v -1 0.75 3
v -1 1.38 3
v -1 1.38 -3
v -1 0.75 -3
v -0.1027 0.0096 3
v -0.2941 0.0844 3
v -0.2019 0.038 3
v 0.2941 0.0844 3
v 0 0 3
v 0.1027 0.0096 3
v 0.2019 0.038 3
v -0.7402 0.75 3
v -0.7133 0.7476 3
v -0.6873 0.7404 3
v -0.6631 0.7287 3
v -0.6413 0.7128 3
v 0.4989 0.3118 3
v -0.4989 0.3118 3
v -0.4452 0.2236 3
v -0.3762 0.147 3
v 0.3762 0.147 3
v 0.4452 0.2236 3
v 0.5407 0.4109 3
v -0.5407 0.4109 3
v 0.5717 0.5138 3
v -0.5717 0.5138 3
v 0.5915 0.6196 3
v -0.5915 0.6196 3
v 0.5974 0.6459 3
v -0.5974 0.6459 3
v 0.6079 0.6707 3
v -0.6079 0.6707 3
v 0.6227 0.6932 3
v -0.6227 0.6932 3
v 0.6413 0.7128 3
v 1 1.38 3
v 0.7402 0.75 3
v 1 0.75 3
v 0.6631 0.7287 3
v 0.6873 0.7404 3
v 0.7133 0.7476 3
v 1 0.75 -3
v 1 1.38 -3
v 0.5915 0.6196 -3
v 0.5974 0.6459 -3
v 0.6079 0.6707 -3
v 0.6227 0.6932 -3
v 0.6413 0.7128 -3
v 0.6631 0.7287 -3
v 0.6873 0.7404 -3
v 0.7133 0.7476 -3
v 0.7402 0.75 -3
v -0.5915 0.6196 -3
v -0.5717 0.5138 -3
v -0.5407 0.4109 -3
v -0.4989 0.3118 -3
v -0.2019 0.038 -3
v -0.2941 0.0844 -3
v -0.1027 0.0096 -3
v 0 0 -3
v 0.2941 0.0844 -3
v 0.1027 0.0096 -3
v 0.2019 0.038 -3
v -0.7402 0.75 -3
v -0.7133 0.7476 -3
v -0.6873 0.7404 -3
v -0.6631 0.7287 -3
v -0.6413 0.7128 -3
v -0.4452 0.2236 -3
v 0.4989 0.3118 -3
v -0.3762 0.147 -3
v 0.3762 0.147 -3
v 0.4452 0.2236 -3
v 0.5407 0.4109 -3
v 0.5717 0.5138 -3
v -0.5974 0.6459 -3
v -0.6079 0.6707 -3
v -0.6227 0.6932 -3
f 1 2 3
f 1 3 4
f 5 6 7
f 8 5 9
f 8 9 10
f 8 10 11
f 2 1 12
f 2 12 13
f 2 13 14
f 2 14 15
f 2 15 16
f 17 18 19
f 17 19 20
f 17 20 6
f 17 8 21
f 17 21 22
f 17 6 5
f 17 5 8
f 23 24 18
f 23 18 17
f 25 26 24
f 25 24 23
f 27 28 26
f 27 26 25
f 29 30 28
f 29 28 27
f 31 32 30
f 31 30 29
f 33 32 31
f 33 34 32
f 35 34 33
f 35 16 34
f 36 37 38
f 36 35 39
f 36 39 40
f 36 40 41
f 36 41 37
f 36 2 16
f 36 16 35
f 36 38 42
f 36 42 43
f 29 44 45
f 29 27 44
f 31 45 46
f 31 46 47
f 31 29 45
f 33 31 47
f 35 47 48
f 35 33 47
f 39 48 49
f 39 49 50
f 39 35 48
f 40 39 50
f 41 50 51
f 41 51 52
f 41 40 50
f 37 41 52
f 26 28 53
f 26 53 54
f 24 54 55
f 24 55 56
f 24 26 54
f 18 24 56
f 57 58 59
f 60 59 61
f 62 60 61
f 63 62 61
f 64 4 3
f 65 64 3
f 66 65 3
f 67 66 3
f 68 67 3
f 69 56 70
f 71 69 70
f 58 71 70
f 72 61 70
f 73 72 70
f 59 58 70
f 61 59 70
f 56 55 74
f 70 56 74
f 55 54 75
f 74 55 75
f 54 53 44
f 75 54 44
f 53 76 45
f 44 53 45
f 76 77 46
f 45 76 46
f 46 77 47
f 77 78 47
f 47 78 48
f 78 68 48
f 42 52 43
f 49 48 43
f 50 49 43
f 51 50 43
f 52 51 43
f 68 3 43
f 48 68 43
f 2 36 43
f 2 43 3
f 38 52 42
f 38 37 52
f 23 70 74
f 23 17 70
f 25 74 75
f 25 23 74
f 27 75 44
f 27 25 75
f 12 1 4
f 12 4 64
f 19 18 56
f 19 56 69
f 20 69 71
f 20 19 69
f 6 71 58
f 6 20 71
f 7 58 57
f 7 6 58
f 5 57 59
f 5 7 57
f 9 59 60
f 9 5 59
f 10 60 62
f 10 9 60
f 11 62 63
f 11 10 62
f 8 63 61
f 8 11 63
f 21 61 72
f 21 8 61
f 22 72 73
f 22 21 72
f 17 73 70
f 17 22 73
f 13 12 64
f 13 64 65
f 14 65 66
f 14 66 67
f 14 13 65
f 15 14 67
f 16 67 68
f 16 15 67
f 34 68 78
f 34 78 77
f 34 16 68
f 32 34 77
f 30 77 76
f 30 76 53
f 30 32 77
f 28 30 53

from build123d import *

# Parameters (mm, degrees)
ESTRUSIONE_ESTRUSIONE1_DEPTH = 3


with BuildPart() as part:
    # Schizzo1 → Estrusione-Estrusione1 (new, symmetric)
    with BuildSketch(Plane.XY):
        with BuildLine():
            Line((0.740175425, 0.75), (1, 0.75))
            Line((1, 0.75), (1, 1.38))
            Line((1, 1.38), (-1, 1.38))
            Line((-1, 1.38), (-1, 0.75))
            Line((-1, 0.75), (-0.740175425, 0.75))
            ThreePointArc((-0.740175425, 0.75), (-0.641268354, 0.712771412), (-0.591456891, 0.619565217))
            ThreePointArc((-0.591456891, 0.619565217), (-0.557611714, 0.461937846), (-0.498876404, 0.311797753))
            ThreePointArc((-0.498876404, 0.311797753), (0, 0), (0.498876404, 0.311797753))
            ThreePointArc((0.498876404, 0.311797753), (0.557611714, 0.461937846), (0.591456891, 0.619565217))
            ThreePointArc((0.591456891, 0.619565217), (0.641268354, 0.712771412), (0.740175425, 0.75))
        make_face()
    extrude(amount=ESTRUSIONE_ESTRUSIONE1_DEPTH, both=True)


solid = part.part
